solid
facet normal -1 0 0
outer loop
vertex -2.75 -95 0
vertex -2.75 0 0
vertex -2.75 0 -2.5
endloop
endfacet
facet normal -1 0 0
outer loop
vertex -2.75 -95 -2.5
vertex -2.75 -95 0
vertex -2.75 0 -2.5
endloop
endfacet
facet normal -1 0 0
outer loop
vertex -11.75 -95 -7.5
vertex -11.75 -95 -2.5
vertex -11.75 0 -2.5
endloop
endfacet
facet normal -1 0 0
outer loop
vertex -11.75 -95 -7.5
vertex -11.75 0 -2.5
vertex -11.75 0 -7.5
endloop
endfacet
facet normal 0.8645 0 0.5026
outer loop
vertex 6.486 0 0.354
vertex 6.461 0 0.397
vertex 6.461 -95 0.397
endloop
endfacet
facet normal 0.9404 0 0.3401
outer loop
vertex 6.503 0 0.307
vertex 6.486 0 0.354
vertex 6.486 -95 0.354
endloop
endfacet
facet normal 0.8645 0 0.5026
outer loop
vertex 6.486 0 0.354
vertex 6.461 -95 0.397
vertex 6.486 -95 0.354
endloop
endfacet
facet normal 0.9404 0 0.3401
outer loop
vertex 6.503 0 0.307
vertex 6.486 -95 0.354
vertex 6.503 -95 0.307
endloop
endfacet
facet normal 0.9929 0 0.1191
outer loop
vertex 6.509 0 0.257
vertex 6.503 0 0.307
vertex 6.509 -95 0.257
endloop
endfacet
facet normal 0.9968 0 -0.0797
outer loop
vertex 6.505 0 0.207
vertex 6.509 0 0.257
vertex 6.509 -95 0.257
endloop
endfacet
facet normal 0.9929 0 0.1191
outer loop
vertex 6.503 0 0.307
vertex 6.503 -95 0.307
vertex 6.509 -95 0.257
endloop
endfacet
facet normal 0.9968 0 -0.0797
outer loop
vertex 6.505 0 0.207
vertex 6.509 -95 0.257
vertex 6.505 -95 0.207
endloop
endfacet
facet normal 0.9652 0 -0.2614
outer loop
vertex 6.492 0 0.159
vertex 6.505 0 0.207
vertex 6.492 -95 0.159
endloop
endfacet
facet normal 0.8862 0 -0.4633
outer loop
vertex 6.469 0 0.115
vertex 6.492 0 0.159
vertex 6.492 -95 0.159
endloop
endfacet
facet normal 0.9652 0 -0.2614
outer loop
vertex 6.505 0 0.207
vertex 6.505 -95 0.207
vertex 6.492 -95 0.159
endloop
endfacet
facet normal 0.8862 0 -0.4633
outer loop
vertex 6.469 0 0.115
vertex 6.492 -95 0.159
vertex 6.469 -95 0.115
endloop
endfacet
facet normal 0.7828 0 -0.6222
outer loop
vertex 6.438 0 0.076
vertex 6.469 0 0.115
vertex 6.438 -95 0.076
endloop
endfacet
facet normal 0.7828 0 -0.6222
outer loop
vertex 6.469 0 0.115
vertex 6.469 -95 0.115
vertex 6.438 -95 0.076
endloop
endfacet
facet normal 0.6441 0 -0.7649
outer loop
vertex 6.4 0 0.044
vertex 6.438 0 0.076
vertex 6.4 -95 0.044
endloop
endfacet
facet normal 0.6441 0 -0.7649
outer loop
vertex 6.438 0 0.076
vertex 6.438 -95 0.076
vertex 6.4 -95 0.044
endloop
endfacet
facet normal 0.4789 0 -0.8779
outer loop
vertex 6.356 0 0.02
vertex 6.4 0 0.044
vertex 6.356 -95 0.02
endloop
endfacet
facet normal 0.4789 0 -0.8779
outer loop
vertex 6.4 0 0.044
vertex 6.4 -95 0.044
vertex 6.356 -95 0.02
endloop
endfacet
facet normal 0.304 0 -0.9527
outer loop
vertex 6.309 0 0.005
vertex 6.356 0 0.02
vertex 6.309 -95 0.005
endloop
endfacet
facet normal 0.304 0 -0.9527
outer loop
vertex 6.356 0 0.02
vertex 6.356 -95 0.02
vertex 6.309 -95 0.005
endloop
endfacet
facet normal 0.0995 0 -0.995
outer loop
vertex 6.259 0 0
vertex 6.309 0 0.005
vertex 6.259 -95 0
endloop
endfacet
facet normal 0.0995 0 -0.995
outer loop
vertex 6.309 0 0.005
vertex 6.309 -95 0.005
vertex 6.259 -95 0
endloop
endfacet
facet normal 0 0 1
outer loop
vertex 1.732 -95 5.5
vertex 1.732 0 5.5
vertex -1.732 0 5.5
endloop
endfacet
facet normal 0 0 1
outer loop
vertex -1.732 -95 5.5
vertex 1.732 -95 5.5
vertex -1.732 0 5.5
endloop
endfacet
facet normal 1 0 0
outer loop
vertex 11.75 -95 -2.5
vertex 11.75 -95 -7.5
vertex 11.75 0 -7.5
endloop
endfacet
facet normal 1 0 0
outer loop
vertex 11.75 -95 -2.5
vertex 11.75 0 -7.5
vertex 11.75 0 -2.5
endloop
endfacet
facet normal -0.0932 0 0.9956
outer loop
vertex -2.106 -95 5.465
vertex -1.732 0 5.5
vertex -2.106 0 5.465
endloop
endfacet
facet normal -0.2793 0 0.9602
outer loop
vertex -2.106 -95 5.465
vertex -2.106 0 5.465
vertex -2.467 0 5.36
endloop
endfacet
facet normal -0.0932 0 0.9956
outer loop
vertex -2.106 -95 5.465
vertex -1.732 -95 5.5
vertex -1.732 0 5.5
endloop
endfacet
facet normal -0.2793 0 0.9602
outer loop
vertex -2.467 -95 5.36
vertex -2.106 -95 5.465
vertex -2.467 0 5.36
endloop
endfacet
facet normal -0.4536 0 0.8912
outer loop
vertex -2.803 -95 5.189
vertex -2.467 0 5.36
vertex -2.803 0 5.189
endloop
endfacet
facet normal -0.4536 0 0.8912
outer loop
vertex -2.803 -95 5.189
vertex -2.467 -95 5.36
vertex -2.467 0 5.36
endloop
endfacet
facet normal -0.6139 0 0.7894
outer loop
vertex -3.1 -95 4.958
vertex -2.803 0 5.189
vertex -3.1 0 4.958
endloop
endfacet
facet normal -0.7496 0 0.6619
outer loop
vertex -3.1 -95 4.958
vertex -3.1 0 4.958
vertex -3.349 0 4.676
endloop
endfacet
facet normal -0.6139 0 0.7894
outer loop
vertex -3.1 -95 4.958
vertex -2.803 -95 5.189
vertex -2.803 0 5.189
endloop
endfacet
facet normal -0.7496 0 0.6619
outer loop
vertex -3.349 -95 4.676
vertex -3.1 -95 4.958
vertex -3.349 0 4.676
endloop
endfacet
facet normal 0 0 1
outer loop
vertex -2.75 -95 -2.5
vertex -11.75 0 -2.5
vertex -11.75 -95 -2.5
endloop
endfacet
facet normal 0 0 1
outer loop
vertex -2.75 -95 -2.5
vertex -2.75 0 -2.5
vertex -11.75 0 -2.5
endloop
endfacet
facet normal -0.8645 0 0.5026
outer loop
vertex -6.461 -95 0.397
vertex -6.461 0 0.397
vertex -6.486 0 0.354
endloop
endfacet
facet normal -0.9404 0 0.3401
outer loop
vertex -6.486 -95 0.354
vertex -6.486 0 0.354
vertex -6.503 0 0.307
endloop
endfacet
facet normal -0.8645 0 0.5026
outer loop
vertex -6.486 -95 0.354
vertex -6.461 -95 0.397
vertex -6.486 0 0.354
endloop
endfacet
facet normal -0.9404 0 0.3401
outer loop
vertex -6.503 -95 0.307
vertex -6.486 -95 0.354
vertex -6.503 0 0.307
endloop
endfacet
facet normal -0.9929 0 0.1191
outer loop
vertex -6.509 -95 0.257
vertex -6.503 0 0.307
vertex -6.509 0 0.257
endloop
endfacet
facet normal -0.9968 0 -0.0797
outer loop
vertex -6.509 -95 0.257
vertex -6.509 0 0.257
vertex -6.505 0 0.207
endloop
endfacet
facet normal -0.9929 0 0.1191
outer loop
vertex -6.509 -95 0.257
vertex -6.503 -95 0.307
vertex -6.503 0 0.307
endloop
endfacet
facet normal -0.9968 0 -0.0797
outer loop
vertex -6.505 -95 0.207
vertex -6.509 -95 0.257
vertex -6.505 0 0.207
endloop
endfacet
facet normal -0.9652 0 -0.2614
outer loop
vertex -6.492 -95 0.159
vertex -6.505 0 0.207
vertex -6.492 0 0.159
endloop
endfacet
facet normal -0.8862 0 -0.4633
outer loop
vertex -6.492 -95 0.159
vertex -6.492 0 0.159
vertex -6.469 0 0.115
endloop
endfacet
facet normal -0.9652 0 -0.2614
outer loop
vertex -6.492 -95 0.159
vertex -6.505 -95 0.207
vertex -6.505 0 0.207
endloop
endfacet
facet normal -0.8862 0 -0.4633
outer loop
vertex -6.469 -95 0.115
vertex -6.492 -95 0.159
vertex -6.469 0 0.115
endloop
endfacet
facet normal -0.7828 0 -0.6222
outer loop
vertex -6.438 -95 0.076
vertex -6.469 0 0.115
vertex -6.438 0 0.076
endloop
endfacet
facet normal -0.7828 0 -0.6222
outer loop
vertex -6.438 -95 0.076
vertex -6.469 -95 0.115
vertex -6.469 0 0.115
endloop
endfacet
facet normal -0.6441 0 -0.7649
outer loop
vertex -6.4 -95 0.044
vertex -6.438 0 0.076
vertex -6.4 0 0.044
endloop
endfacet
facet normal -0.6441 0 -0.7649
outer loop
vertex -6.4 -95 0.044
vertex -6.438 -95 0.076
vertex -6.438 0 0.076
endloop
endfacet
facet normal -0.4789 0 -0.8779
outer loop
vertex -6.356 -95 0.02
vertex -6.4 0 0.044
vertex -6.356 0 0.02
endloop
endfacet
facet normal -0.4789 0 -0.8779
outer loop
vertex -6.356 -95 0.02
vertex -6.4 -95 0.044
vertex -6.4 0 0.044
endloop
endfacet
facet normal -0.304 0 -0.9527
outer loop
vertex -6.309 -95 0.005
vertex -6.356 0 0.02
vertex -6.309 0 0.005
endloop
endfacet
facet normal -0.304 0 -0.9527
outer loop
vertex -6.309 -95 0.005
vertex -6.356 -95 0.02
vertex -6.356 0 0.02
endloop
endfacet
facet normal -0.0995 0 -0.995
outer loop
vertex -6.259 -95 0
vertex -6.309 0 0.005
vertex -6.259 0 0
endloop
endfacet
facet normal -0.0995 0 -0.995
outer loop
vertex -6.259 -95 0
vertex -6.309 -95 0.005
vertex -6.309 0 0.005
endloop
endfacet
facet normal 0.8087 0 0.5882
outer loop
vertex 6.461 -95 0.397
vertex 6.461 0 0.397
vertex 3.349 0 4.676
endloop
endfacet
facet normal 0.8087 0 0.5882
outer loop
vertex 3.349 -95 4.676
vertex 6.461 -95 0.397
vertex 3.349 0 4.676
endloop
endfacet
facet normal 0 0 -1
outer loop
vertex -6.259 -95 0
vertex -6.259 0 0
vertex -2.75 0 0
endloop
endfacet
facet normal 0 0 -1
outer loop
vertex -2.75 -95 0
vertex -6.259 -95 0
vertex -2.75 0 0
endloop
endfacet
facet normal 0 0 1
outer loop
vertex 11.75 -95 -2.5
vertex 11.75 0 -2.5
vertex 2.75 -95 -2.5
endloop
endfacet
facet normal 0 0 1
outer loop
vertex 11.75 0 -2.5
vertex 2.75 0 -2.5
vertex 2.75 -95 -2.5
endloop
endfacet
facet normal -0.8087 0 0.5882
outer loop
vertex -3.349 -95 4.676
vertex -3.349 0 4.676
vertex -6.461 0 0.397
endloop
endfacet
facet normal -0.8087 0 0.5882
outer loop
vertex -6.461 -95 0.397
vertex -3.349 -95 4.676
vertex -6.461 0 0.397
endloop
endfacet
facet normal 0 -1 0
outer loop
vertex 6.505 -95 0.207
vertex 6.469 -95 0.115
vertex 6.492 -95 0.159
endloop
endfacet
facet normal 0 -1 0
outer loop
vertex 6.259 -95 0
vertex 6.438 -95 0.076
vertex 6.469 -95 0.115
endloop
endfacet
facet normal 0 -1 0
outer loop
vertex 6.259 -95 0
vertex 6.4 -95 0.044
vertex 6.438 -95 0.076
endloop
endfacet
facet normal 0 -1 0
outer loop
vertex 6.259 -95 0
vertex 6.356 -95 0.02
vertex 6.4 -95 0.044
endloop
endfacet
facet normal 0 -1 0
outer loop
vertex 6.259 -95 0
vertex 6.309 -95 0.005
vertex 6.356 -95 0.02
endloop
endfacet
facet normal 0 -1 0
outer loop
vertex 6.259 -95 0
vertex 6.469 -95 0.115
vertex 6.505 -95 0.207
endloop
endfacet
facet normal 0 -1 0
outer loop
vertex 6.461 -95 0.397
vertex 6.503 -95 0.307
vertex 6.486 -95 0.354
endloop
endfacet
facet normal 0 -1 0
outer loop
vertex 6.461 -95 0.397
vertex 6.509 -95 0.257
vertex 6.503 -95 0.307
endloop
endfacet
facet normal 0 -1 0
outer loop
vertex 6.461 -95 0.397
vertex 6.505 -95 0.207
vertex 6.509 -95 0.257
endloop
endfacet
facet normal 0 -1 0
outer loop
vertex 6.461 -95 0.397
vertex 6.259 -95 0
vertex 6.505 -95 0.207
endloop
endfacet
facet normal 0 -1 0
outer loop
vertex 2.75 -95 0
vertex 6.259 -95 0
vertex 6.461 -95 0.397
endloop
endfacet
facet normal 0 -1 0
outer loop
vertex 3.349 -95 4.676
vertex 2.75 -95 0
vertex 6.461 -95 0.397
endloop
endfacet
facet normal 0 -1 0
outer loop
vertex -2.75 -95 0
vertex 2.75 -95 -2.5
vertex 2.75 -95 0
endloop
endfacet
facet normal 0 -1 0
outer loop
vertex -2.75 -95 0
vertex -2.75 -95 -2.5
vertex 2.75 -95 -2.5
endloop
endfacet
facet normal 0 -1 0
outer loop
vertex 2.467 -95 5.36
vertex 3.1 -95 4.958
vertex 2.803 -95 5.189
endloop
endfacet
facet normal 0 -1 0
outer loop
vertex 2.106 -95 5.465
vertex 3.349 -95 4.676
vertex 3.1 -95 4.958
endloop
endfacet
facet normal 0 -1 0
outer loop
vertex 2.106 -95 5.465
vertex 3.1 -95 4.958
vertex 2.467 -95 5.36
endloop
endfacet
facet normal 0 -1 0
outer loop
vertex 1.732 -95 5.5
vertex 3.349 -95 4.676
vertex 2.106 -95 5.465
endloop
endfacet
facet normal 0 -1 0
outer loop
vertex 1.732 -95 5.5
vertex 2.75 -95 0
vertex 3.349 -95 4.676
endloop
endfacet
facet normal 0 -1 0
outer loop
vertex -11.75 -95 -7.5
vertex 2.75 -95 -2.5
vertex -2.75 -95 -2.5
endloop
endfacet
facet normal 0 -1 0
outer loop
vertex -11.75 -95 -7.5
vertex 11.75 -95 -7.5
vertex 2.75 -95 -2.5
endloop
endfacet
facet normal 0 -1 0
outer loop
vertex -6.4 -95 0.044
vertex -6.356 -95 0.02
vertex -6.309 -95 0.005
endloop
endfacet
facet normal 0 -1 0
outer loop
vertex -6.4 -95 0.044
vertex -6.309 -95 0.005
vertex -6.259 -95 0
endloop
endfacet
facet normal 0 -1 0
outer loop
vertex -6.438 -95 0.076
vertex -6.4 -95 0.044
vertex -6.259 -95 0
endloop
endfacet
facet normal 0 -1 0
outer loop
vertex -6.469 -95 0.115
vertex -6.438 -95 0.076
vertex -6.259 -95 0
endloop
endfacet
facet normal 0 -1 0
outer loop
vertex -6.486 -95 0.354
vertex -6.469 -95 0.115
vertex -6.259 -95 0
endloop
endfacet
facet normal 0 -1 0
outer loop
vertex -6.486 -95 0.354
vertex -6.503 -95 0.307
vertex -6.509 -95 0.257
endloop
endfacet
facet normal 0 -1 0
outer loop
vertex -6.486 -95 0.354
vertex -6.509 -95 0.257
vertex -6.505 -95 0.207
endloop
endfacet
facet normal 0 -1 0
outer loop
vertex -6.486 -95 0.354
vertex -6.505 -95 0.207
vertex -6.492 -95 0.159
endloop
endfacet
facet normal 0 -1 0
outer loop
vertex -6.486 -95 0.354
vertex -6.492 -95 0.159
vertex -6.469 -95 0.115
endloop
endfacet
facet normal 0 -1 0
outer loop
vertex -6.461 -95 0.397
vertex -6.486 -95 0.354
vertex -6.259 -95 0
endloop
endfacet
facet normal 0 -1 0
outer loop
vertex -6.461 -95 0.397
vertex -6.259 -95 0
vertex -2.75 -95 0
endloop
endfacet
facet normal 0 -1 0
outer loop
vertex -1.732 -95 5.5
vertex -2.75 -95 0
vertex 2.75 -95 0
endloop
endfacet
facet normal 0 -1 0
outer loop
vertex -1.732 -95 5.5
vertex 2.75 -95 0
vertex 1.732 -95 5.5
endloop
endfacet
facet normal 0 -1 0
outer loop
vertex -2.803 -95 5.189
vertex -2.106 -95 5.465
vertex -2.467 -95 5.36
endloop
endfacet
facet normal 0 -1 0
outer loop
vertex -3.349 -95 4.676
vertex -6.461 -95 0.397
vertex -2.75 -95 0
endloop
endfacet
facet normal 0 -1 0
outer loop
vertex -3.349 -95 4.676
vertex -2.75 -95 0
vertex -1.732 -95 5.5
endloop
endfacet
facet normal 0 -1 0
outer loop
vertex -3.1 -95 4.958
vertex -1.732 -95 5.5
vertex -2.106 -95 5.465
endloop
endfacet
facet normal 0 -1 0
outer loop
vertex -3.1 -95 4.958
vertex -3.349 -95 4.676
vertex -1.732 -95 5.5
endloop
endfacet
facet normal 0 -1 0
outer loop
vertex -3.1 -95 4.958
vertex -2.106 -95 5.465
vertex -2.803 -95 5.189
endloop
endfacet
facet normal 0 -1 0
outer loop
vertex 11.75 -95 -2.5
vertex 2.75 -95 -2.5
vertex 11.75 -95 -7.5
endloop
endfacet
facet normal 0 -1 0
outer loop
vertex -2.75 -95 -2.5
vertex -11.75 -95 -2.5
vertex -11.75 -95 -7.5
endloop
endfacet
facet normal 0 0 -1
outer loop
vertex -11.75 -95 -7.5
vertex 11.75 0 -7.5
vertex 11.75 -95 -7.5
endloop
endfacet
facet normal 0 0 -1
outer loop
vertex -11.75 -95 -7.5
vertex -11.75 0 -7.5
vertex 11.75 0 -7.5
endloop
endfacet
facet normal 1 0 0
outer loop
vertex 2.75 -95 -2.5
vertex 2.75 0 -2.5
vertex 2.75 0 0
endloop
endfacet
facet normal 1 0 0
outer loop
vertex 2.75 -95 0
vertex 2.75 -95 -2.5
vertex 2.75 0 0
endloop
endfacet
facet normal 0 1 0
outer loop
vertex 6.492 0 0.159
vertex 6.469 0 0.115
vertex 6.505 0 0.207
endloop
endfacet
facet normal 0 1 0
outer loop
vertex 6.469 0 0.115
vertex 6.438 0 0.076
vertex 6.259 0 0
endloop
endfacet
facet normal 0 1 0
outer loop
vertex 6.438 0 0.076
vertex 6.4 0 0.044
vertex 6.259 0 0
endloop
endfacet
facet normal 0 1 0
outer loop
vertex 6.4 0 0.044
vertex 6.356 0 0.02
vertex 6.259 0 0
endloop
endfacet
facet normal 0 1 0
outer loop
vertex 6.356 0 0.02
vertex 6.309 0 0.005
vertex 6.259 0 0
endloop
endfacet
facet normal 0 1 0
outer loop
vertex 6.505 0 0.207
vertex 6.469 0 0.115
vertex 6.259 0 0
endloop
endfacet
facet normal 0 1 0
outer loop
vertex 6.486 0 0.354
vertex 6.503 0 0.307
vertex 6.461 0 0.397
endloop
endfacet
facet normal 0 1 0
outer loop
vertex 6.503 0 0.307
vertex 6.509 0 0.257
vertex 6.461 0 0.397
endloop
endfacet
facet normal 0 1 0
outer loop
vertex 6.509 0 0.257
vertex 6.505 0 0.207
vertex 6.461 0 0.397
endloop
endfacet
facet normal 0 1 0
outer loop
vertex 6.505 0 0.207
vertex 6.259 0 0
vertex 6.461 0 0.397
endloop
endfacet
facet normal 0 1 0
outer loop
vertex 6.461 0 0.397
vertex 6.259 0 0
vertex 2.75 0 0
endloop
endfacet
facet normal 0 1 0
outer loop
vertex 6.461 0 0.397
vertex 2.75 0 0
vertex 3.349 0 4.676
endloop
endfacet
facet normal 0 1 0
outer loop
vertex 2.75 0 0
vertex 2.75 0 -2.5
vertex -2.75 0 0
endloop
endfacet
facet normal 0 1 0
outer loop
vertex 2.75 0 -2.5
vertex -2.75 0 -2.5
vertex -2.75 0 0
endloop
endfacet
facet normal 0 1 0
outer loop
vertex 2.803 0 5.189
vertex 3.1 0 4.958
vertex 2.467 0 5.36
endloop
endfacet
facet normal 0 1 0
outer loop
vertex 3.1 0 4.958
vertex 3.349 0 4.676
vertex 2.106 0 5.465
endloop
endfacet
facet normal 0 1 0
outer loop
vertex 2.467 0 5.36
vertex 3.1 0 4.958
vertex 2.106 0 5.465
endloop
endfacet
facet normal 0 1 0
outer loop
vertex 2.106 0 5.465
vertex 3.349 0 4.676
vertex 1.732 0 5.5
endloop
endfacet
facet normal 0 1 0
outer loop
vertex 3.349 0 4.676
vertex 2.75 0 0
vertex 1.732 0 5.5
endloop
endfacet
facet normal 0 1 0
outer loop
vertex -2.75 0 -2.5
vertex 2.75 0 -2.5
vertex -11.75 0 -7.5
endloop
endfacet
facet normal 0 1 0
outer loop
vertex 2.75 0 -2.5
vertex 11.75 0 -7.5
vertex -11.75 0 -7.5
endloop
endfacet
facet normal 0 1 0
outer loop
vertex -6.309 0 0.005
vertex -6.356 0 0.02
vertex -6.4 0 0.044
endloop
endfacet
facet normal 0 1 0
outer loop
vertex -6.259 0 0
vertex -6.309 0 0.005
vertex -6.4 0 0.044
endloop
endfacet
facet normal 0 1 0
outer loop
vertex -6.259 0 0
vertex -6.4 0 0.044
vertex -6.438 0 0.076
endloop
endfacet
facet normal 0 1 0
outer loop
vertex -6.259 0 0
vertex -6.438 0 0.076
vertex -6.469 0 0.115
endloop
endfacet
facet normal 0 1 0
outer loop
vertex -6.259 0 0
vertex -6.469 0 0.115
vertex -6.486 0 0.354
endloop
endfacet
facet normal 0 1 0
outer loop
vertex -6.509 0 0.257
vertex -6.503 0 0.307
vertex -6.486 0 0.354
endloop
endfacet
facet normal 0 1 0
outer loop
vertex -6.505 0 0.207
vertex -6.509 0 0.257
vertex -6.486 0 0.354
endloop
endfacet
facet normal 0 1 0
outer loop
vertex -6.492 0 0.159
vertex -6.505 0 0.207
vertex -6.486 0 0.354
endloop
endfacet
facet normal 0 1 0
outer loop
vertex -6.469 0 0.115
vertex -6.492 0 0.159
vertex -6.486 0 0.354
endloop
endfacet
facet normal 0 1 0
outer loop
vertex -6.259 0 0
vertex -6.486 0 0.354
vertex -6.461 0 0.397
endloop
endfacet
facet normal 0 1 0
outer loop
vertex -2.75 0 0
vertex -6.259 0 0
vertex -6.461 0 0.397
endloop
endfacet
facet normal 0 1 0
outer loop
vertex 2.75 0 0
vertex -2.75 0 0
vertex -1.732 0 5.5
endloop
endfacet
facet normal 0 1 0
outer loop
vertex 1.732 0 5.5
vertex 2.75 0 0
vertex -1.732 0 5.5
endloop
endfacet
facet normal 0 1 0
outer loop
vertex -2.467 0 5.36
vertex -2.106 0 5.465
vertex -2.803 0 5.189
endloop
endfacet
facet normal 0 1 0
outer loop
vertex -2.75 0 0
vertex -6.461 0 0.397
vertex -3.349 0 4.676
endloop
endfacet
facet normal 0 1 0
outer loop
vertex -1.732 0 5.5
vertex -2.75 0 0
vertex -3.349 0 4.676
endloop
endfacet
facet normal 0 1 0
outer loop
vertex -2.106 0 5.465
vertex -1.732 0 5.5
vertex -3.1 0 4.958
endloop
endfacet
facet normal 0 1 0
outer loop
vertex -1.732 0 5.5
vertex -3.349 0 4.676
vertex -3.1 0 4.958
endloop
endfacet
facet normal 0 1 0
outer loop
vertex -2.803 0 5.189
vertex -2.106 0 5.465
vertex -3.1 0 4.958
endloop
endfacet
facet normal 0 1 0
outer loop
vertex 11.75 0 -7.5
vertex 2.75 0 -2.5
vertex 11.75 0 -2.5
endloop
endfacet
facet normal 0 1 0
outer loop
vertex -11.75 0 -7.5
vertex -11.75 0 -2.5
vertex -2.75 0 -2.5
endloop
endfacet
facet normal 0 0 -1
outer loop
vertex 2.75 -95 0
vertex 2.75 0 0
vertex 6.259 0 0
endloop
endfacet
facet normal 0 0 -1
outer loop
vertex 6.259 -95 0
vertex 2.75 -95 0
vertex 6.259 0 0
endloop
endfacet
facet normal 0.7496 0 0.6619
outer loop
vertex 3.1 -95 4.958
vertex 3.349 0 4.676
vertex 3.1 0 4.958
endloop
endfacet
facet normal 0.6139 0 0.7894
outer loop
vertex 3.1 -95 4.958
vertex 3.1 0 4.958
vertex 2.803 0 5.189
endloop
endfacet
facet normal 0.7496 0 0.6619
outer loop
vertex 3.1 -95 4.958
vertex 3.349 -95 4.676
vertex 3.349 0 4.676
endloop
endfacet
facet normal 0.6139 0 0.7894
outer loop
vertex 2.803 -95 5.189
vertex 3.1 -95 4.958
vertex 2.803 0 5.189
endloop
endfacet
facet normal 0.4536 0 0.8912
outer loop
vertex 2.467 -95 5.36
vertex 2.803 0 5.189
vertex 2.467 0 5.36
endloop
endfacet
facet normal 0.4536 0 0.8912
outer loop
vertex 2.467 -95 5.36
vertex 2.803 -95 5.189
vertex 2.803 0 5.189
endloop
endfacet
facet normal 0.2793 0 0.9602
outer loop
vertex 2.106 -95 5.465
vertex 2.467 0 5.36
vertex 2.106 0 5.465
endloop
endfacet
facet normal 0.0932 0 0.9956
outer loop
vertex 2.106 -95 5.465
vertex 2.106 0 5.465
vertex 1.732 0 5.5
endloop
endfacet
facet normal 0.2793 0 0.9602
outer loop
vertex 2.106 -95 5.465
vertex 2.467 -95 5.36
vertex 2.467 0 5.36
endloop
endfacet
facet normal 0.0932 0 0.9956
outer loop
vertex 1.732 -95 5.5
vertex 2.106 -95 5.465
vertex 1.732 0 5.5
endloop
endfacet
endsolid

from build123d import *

# Parameters (mm, degrees)
F0_W     = 2.75
F0_H     = 5.5
F1_DEPTH = 95
F2_R     = 2
F3_R     = 0.25
F4_DEPTH = 5
F5_DEPTH = 5


with BuildPart() as f1:
    # F0 (on Front) → F1 (new body)
    with BuildSketch(Plane.XZ):
        with Locations((1.375, 2.75)):
            Rectangle(F0_W, F0_H)
        Polygon((0, 0), (-2.75, 0), (-2.75, -2.5), (-6.75, -2.5), (-6.75, -7.5), (6.75, -7.5), (6.75, -2.5), (2.75, -2.5), (2.75, 0), align=None)
        Polygon((2.75, 5.5), (2.75, 0), (6.75, 0), align=None)
        with Locations((-1.375, 2.75)):
            Rectangle(F0_W, F0_H)
        Polygon((-2.75, 5.5), (-6.75, 0), (-2.75, 0), align=None)
    extrude(amount=F1_DEPTH)

    # F2
    f2_edges = [f1.edges().sort_by_distance(p)[0] for p in [
        (2.75, -47.5, 5.5),
        (-2.75, -47.5, 5.5),
    ]]
    fillet(f2_edges, radius=F2_R)

    # F3
    f3_edges = [f1.edges().sort_by_distance(p)[0] for p in [
        (6.75, -47.5, 0),
        (-6.75, -47.5, 0),
    ]]
    fillet(f3_edges, radius=F3_R)

    # F4 (add): a face of the model
    f4_faces = [f1.faces().sort_by_distance(p)[0] for p in [
        (-6.75, -47.5, -5),
    ]]
    extrude(f4_faces, amount=F4_DEPTH)

    # F5 (add): a face of the model
    f5_faces = [f1.faces().sort_by_distance(p)[0] for p in [
        (6.75, -47.5, -5),
    ]]
    extrude(f5_faces, amount=F5_DEPTH)


solid = f1.part
